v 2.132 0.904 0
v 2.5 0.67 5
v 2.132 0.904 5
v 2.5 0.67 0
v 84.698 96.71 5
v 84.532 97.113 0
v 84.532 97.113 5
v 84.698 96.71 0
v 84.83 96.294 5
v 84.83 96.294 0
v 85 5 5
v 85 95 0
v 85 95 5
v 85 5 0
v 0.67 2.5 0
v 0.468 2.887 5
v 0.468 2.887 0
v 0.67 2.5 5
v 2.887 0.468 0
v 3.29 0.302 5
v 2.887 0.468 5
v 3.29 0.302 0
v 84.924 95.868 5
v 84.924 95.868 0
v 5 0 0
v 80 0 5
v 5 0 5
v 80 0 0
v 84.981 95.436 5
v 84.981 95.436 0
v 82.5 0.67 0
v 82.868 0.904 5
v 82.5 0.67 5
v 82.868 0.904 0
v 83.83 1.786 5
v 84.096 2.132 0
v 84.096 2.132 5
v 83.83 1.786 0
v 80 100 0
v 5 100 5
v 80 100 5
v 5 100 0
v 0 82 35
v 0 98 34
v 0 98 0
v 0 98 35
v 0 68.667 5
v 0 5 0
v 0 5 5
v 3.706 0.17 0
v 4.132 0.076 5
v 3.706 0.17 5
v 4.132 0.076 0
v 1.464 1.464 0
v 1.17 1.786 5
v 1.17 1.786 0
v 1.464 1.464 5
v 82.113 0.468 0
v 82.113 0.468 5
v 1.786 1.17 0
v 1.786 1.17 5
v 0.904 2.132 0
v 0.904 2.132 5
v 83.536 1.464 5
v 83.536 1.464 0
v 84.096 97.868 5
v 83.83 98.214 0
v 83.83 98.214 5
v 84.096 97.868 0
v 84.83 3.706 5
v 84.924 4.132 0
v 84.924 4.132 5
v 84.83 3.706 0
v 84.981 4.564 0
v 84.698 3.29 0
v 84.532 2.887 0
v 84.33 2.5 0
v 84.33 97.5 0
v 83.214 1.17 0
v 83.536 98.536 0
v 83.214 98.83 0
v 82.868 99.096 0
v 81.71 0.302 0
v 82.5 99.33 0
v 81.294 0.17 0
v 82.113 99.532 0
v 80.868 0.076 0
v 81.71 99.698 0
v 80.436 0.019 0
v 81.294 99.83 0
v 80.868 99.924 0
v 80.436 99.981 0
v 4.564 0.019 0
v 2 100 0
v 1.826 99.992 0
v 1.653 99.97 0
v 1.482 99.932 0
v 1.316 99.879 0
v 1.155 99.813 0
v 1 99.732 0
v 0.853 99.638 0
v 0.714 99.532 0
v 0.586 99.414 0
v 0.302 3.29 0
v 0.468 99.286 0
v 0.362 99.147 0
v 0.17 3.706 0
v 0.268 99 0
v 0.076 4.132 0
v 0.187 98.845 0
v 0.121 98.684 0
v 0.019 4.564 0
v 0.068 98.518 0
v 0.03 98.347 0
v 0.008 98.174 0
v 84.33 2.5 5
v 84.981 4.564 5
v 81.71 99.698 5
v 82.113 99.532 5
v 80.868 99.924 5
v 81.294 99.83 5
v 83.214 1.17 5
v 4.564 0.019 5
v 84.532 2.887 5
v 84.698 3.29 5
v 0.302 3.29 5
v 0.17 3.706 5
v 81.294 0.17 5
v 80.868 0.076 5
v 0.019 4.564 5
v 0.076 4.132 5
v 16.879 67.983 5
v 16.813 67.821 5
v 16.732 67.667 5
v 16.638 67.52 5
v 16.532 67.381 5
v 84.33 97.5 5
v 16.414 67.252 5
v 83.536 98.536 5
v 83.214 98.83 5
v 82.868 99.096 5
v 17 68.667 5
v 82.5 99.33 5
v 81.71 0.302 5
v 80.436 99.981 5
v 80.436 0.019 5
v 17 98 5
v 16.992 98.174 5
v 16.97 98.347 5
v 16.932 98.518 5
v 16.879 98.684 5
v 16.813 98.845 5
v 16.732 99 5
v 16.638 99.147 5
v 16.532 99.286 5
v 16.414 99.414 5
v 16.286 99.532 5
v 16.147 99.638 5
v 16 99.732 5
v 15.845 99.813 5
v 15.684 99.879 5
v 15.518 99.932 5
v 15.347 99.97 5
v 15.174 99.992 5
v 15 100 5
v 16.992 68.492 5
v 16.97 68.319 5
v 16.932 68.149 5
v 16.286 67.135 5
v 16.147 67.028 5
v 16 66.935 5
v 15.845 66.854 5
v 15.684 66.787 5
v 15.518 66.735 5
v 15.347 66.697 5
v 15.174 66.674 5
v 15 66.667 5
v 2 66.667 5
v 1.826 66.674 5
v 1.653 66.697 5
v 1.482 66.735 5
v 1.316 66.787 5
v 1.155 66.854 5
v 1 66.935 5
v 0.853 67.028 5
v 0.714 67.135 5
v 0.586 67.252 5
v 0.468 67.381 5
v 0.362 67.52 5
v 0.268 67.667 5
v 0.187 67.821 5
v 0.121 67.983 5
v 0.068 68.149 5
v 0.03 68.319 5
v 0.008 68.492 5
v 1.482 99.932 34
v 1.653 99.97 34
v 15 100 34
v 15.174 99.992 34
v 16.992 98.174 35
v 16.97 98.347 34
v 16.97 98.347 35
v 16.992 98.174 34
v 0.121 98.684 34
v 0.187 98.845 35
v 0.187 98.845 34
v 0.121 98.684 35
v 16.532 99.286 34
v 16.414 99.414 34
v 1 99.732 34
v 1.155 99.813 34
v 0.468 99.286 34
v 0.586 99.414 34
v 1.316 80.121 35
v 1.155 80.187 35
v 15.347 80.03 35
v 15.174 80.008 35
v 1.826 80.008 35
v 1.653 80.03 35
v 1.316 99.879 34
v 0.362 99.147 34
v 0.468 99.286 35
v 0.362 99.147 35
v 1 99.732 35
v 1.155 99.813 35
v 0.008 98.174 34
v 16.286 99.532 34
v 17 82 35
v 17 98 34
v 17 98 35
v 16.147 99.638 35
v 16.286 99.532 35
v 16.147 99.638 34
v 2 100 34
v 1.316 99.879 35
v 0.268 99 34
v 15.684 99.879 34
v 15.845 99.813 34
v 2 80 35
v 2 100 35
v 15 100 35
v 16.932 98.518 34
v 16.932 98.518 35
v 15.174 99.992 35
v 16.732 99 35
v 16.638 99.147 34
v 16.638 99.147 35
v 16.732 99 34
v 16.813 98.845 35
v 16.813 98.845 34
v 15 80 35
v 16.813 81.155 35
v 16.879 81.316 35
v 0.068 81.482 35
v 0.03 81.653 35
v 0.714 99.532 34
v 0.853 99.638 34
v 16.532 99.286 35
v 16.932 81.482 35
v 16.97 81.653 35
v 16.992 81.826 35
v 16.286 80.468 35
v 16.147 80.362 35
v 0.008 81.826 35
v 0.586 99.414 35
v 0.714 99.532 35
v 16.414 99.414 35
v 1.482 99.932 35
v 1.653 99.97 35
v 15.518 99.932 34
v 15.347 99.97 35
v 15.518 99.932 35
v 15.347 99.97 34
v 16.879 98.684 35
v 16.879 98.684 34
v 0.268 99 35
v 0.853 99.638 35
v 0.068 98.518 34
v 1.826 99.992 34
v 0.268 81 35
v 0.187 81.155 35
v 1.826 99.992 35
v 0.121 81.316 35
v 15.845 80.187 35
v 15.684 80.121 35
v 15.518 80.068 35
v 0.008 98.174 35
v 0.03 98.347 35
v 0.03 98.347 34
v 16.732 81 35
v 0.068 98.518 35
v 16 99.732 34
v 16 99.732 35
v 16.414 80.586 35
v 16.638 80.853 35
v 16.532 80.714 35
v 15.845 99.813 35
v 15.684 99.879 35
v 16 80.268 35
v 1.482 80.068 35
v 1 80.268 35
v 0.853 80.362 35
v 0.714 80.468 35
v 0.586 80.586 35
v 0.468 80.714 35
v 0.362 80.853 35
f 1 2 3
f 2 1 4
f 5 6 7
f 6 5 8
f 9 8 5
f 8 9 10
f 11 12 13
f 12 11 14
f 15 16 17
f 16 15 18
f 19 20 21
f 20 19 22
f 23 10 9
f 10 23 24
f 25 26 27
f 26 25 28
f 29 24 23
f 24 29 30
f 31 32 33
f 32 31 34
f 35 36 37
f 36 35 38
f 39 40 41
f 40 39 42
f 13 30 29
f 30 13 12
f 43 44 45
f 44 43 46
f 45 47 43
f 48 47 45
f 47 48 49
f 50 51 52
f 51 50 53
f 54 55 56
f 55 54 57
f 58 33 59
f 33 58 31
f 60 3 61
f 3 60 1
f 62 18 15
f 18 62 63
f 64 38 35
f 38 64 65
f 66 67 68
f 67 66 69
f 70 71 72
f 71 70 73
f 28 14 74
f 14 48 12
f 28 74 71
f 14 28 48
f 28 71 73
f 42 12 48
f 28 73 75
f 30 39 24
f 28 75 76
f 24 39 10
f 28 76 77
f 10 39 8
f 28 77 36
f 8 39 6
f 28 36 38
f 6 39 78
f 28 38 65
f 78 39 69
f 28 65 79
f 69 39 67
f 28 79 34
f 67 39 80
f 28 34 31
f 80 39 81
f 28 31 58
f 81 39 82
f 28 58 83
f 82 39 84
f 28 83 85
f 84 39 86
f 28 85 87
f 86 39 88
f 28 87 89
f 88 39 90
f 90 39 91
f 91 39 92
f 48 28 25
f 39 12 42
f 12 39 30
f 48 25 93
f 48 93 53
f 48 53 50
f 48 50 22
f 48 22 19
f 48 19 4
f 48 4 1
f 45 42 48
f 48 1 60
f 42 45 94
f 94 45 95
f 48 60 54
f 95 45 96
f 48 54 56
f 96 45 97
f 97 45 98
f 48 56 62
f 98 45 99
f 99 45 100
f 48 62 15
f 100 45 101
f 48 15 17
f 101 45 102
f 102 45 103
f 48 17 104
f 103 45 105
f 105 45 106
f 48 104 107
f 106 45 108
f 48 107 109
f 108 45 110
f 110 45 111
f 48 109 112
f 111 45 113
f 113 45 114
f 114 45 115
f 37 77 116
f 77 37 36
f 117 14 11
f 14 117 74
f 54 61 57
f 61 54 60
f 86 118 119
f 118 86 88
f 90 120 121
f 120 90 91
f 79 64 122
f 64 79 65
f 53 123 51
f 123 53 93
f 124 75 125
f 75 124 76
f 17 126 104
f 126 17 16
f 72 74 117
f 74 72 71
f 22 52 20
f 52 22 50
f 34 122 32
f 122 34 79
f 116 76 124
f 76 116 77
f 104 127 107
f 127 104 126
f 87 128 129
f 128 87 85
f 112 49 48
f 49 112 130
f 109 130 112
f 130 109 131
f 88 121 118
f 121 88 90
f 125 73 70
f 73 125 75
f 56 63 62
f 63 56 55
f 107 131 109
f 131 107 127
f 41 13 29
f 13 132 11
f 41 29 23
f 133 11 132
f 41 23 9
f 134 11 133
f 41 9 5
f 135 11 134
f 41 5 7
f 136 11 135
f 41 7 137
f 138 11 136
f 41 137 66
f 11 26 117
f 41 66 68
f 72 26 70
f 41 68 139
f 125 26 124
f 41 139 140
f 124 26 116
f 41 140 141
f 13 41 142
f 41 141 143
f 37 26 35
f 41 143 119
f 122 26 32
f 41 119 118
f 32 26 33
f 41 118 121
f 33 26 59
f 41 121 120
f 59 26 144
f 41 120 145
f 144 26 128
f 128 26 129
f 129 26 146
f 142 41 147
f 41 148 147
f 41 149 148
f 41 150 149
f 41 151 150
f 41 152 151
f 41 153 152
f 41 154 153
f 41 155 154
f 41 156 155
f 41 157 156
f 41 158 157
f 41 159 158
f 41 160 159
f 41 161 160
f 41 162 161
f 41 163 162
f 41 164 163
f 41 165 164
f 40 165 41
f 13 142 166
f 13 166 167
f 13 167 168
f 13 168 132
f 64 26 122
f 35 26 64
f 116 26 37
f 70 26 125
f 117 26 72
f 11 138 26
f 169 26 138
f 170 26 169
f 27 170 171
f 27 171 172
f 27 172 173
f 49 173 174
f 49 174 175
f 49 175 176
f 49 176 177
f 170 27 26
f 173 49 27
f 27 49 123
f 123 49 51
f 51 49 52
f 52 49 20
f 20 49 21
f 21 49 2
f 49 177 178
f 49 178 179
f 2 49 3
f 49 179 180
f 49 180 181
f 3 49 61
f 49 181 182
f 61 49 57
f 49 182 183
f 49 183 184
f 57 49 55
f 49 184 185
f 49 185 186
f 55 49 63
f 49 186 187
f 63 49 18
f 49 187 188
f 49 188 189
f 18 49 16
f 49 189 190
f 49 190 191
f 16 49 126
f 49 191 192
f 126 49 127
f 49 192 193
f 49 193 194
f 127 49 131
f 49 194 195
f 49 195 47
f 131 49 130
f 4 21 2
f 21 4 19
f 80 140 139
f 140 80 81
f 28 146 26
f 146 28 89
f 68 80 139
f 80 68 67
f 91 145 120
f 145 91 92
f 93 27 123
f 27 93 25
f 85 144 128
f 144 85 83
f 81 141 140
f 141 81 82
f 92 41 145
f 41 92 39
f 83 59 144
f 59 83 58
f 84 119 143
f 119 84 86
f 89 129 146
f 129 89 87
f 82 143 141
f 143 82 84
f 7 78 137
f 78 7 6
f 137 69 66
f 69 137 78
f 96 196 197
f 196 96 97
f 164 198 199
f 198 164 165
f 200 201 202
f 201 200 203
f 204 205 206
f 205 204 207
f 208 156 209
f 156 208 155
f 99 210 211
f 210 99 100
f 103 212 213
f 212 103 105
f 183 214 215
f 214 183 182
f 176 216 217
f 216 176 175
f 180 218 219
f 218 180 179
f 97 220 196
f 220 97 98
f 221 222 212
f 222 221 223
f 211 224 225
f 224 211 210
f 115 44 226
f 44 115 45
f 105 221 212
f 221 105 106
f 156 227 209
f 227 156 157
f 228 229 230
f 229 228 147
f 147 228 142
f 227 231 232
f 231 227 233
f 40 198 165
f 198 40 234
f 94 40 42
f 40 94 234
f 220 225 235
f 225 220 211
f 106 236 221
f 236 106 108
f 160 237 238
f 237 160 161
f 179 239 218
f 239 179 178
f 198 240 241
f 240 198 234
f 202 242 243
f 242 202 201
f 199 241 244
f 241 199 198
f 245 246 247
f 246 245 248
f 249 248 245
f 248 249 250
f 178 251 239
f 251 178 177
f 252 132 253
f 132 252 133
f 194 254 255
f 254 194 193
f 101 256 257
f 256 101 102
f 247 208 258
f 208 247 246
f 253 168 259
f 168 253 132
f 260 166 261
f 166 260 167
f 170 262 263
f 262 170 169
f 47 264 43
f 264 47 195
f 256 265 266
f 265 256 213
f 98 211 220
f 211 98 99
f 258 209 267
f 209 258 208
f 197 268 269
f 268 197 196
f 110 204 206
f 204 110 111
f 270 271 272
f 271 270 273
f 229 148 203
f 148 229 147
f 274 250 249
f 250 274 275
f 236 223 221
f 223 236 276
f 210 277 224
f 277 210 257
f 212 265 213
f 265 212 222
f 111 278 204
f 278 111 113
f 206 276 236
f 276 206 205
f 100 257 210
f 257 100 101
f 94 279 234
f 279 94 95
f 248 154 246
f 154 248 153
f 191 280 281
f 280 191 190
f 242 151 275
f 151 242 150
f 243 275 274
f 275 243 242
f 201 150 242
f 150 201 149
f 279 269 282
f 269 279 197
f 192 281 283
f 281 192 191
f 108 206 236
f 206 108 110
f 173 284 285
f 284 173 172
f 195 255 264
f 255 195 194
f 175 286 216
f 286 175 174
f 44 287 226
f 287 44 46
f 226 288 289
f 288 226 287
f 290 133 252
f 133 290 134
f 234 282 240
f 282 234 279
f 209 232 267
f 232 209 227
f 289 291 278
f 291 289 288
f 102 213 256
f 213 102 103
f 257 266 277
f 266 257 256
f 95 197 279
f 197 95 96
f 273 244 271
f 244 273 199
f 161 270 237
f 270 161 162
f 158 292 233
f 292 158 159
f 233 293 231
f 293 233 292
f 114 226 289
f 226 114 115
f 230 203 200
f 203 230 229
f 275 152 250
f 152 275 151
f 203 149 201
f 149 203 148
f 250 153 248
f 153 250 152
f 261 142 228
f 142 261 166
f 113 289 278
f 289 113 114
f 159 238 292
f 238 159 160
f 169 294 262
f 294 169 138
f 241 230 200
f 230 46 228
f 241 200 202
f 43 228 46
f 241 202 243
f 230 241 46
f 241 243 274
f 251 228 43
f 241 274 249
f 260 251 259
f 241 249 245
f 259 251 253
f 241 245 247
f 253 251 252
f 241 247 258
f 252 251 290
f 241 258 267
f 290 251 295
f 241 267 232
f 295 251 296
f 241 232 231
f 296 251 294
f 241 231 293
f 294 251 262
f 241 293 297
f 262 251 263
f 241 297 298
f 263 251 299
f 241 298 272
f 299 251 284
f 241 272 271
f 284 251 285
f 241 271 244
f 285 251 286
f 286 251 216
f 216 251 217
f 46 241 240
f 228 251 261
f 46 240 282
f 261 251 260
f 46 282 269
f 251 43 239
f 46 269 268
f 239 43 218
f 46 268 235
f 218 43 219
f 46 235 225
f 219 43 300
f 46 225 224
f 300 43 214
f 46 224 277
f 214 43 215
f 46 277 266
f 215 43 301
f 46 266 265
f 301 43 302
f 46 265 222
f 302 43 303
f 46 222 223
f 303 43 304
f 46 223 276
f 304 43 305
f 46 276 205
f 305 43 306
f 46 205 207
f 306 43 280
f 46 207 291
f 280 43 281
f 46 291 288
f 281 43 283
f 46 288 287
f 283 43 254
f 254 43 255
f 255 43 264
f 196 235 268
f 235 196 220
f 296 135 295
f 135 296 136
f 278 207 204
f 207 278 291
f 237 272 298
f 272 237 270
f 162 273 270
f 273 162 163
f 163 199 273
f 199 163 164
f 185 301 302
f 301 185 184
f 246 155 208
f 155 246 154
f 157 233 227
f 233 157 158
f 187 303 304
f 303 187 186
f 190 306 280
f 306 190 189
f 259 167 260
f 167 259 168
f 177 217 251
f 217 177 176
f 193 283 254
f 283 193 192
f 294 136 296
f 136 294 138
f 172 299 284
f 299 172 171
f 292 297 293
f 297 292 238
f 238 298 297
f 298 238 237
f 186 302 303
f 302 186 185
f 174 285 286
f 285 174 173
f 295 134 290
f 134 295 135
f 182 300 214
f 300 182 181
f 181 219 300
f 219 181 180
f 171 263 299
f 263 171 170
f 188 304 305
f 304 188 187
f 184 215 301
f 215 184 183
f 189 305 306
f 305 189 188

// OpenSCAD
// * Discription what the *.scad is about ect.

// ==================================
// = Used Libraries =
// ==================================

// ==================================
// = Variables =
// ==================================

/* [Tab Name_1] */
// sizing printing or print a small part to test the object.
DesignStatus="sizing"; // ["sizing","fitting","printing"]
// Variables seen by customizer

BasePlateDIMENSION_X=85;
BasePlateDIMENSION_Y=100;
BasePlateRADIUS=5;
BasePlateDIMENSION_Z=5;

module __Customizer_Limit__ () {}  // before these, the variables are usable in the cutomizer
shown_by_customizer = false;

Invisible=42;
TestslabTransl_X=25;
TestslabRotate_X=30;

// === Facettes Numbers ===

FN_HexNut=6;
FN_Performance=36;
FN_FooBaa=12;
// Divisebile by 4 to align Cylinders whithout small intersections taht cause problems due to smal holes in surfaches and self intersections on round objects

FN_Rough=12;
FN_MediumRough=16;
FN_Medium=36;
FN_Fine=72;
FN_ExtraFine=144;
// ==================================
// = Tuning Variables =
// ==================================
// Variables for finetuning (The Slegehammer if something has to be made fit)

// ==================================
// = Customizer Section =
// ==================================
if (DesignStatus=="printing"){
    Main_Assembly(36,76,"false");
}
if(DesignStatus=="fitting"){
    intersection(){
        translate([0,0,1]){
            cube([1000,1000,1],center=true);
        }
        Main_Assembly(16,76,"false");
    }
}
if (DesignStatus=="sizing"){
    Main_Assembly(16,36,"true");
}
// ==================================
// = MAINASSEMBLY =
// ==================================
// LOW_RESOLUTION: low reaulution value to speed up preview
// HIGH_RESOLUTION: high resolution value for rendering the .stl
// CUT_MODULES_RENDERED: decides if the cuttingmodules get renderred to see them. use cuttingmodules twice one time within the final part to cut and one time to just schow it.
// Main_Assembly(12,76,true);
module Main_Assembly(LOW_RESOLUTION=12,HIGH_RESOLUTION=36,CUT_MODULES_RENDERED){
$fn = $preview ? LOW_RESOLUTION : HIGH_RESOLUTION ; // Facets in preview (F5) set to 12, in Reder (F6) is set to 72
    see_me_in_colourful(){
        translate([0,0,0]){
            difference(){
                Base_Plate_Wall_Mount();
//                TEST_OBJECT();
                translate([25,40,15]){                    
                    scale([0.4,0.4,0.4]){        
//                        TEST_CUTCUBE();
            }
        }
    }
        }
        translate([0,0,0]){
        
        }        
        translate([0,0,0]){
            difference(){
//                TEST_SPHERE();
                
            }
        }
        translate([0,0,0]){
        }
        translate([0,0,0]){
            if(CUT_MODULES_RENDERED=="true"){
//                TEST_CUTCYLINDER();
            }
            else{
                echo("CUT_MODULES_RENDERED= ",CUT_MODULES_RENDERED);
            }
        }
        union(){
            
        }
        translate([ 0,0,0]){
        }
    }
}
// ===============================================================================
// = Module to help coloring different modules to make it easier 
// ===============================================================================
module see_me_in_colourful(){ // iterates the given modules and colors them automaticly by setting values using trigonometric funktions
    translate([0,0,0]){
        for(i=[0:1:$children-1]){
            a=255;
            b=50;       // cuts away the dark colors to prevent bad visual contrast to backgound
            k_farbabstand=((a-b)/$children);
            Farbe=((k_farbabstand*i)/255);
            SINUS_Foo=0.5+(sin(((360/(a-b))*k_farbabstand)*(i+1)))/2;
            COSIN_Foo=0.5+(cos(((360/(a-b))*k_farbabstand)*(i+1)))/2;
            color(c = [ SINUS_Foo,
                        1-(SINUS_Foo/2+COSIN_Foo/2),
                        COSIN_Foo],
                        alpha = 0.5){  
                difference(){
                    render(convexity=10){children(i);} //renders the modules, effect is that inner holes become visible
                    //children(i);
                    translate([70/2,0,0]){
                        //cube([80,90,150],center=true);
                    }
// Creates a Cutting to see a Sidesection cut of the objects
                    color(c = [ SINUS_Foo,
                                1-(SINUS_Foo/2+COSIN_Foo/2),
                                COSIN_Foo],
                                alpha = 0.0){
                        translate([70/2,0,0]){
                            //cube([30,20,150],center=true);
                        }
                        translate([-50,-50,0]){
                            //cube([100,50,200],center=false);
                        }
                    }
                }
            }
        }
    }
}
// ===============================================================================
// =--------------------------------- Enviroment Modules ------------------------=
// ===============================================================================
// Modules that resembles the Enviroment aka the helmet where to atach a camera mount

// ===============================================================================
// =--------------------------------- Modules -----------------------------------=
// ===============================================================================

//BasePlateDIMENSION_X=85;
//BasePlateDIMENSION_Y=100;
//BasePlateRADIUS=5;
//BasePlateDIMENSION_Z=5;

module Hanger_Fork(){
   
}

//TEST_OBJECT();
module TEST_OBJECT(){
    difference(){
        TEST_CUTCUBE(TestSlab_X,TestSlab_Y,TestSlab_Z);
        TEST_CUTCYLINDER();
    }
    TEST_SPHERE();
}

module TEST_CUTCUBE(X=30,Y=60,Z=15){
    cube([X,Y,Z]);
}
module TEST_SPHERE(D=TestSphere_D){
//$fn = $preview ? 12 : 72; // Facets in preview (F5) set to 12, in Reder (F6) is set to 72
    difference(){
        sphere(d=D);
        TEST_CUTCYLINDER();
    }
}
module TEST_CUTCYLINDER(H=TestCylinder_H,D1=TestCylinder_D1,D2=TestCylinder_D2){
    cylinder(h=H,d1=D1,d2=D2,$fn=24);
}

// ===============================================================================
// ---------------------------------- Cutting Modules ----------------------------
// ===============================================================================
//Press_Fit_Cut(33,14,17,0.8);
module Press_Fit_Cut(Angle=22,Thickness=11,Length=22,Width=0.2){
    rotate([0,0,Angle]){
        translate([0,0,Thickness/2]){
            cylinder(h=Thickness,d=Width,center=true,$fn=12);
        }
        translate([0,-Width/2,0]){
            cube([Length,Width,Thickness]);
        }
        translate([Length,0,Thickness/2]){
            cylinder(h=Thickness,d=Width,center=true,$fn=12);
        }
    }
}

//Screwcutter(100,10,100,4,1,5);
module Screwcutter( SCREW_HEAD_h=200,
                    SCREW_HEAD_d=40,
                    SCREW_BOLT_h=200,
                    SCREW_BOLT_d=3,
                    SCREW_CAMPFER_h,
                    SCREW_CAMPFER_d=SCREW_BOLT_d    ){
    translate([0,0,-SCREW_HEAD_h]){
        cylinder(h=SCREW_HEAD_h,d=SCREW_HEAD_d,$fn=32);
    }
    translate([0,0,0]){
        cylinder(h=SCREW_CAMPFER_h,d2=SCREW_BOLT_d,d1=SCREW_CAMPFER_d,$fn=32);    
    }
    translate([0,0,0]){
        cylinder(h=SCREW_BOLT_h,d=SCREW_BOLT_d,$fn=32);
    }
}
//Bolt(25,3,8,3);
module Bolt(BOLTLENGTH,BOLTDIAMETER,HEADDIAMETER,HEADHEIGHT){
    cylinder(h=BOLTLENGTH,d=BOLTDIAMETER,center=false,$fn=FN_Performance);
    translate([0,0,-HEADHEIGHT/2]){
        cylinder(h=HEADHEIGHT,d=HEADDIAMETER,center=true,$fn=6);
        cylinder(h=HEADHEIGHT,d=HEADDIAMETER,center=true,$fn=6);
    }
}
//Projection_Cutter(3){sphere(10);};
module Projection_Cutter(Offset_z){    
    projection(cut = true){
        translate([0,0,Offset_z]){
            children();
        }
    }
}
// ===============================================================================
// ---------------------------------- Intersection Modules -----------------------
// ===============================================================================

module Intersection_Test_Cut(PLAIN,THICKNESS,OFFSET){
// ==== EXAMPLE ====
//    !Intersection_Test_Cut("xy",1,7/2){sphere(7);};
// ==== EXAMPLE ====
    if (PLAIN=="xz"){
        intersection(){
            children();
            translate([0,OFFSET,0]){
                cube([100,THICKNESS,100],center=true);
            }
        }
    }
    else if (PLAIN=="xy") {
        intersection(){
            children();
            translate([0,0,OFFSET]){
                cube([500,500,THICKNESS],center=true);
            }
        }
    }
    else if (PLAIN=="yz") {
        intersection(){
            children();
            translate([OFFSET,0,0]){
                cube([THICKNESS,100,100],center=true);
            }
        }   
    }
}
// ===============================================================================
// ---------------------------------- Linear Extrude Modules ---------------------
// ===============================================================================
//BasePlateWallMount();
module Base_Plate_Wall_Mount(){
    linear_extrude(height=BasePlateDIMENSION_Z){
        2D_Rounded_Square_Base_Shape(BasePlateDIMENSION_X,BasePlateDIMENSION_Y,BasePlateRADIUS,CENTER=false);
    }
}
//Ring_Shaper(3,15,1.5);
module Ring_Shaper(HEIGHT,OUTER,WALLTHICKNESS){
    linear_extrude(HEIGHT){
        2D_Ring_Shape(OUTER,WALLTHICKNESS);
    }
}
//Linear_Extruding(10,-1){2D_Rounded_Square_Base_Shape(10,20,3);}
module Linear_Extruding(ExtrudeLength,ExrtudingDirektionInverter){
//   0  Normal
//  -1  inverted
//   1  
    Length=ExtrudeLength;
    translate([0,0,Length*ExrtudingDirektionInverter]){
        linear_extrude(height=ExtrudeLength){
            children();
        }
    }
}

// ===============================================================================
// ---------------------------------- Rotate Extrude Modules ---------------------
// ===============================================================================

//DONUT(1,20,1,7);
module DONUT(DIAMETER,DIAMETER_RING,SCAL_X,SCAL_Y){
//DIAMETER The dough part
//DIAMETER_RING The hole part
//SCAL_X, skales the x dimension
//SCAL_Y, skales the y dimension
    rotate_extrude(angle=360,convexity=3,$fn=FN_Fine){
        translate([DIAMETER_RING,0,0]){
            scale([SCAL_X,SCAL_Y,1]){
                circle(d=DIAMETER,$fn=FN_Fine);
            }
        }
    }
}
// ===============================================================================
// =--------------------------------- 2D-Shapes ---------------------------------=
// ===============================================================================
Hanger_Fork_Z=35;

//!Base_Plate_Hanger_Fork();
//BasePlateDIMENSION_X=85;
//BasePlateDIMENSION_Y=100;
//BasePlateRADIUS=5;
//BasePlateDIMENSION_Z=5;
HangerRounderR=2;
LINeXtrude=1;
hull(){
    linear_extrude(height=BasePlateDIMENSION_Z){
        translate([0,BasePlateDIMENSION_Y-BasePlateDIMENSION_Y/3,Hanger_Fork_Z]){
        2D_Rounded_Square_Base_Shape(BasePlateDIMENSION_X/5,BasePlateDIMENSION_Y/3,HangerRounderR,CENTER=false);
//        Base_Plate_Hanger_Fork();
        }
    }
    translate([0,BasePlateDIMENSION_Y-BasePlateDIMENSION_Y/5,Hanger_Fork_Z]){
        translate([0,0,-LINeXtrude]){
            linear_extrude(height=LINeXtrude){
                2D_Rounded_Square_Base_Shape(BasePlateDIMENSION_X/5,BasePlateDIMENSION_Y/5,HangerRounderR,CENTER=false);
            }
        }
    }
}
module Base_Plate_Hanger_Fork(){
    hull(){
        translate([0,BasePlateDIMENSION_Y,0]){
            circle(r=HangerRounderR);
        }
        translate([0,BasePlateDIMENSION_Y-BasePlateDIMENSION_Y/3,0]){
            circle(r=HangerRounderR);
        }
        translate([BasePlateDIMENSION_X/5,BasePlateDIMENSION_Y-BasePlateDIMENSION_Y/3,0]){
            circle(r=HangerRounderR);
        }
        translate([BasePlateDIMENSION_X/5,BasePlateDIMENSION_Y,0]){
            circle(r=HangerRounderR);
        }
    }  
}
//2D_Ring_Shape(20,1);
module 2D_Ring_Shape(OUTER_D,WALLTHICKNESS){
    difference(){
        circle(d=OUTER_D,$fn=FN_Fine);
        circle(d=OUTER_D-2*WALLTHICKNESS,$fn=FN_Fine);
    }
}
//2D_Rounded_Square_Base_Shape(10,20,3);
module 2D_Rounded_Square_Base_Shape(DIMENSION_X=10,DIMENSION_Y=20,RADIUS=2,CENTER=true){
    if(CENTER){
        translate([0,0,0]){
            minkowski(){
                square([DIMENSION_X-RADIUS*2,DIMENSION_Y-RADIUS*2],center=CENTER);
                circle(r=RADIUS,$fn=FN_Fine);
            }
        }
    }
    else{
        translate([RADIUS,RADIUS,0]){
            minkowski(){
                square([DIMENSION_X-RADIUS*2,DIMENSION_Y-RADIUS*2],center=CENTER);
                circle(r=RADIUS,$fn=FN_Fine);
            }
        }
    }
}
//HEX_Mesh_Pattern(){ Mesh(2.5,2.5);}
module HEX_Mesh_Pattern(X=10,Y=30,DELTA=5,GRPL_X=45,GRPL_Y=115){
Count_X=X;
Count_Y=Y;
DIMENSION_X=35;
DIMENSION_Y=67;


//DELTA=1;

X_STEPP=5.5+DELTA;
Y_STEPP=7.5+DELTA;

k=DELTA; //Distance between Hexshapes may be HEX_D/4 is good
HEX_D=(DIMENSION_X-((Count_X-1)*k/2))/(Count_X-1);

SCALE_Y=DIMENSION_Y/((HEX_D/2+k/4)*sqrt(3)*(Count_Y-1));
echo("HEX_D*Count_Y",HEX_D*(Count_Y));
echo("GrindingPlate_Y",DIMENSION_Y);
echo("SCALE_Y",SCALE_Y);

//square([15,(HEX_D/2+k/4)*sqrt(3)*(Count_Y-1)]); // Helper Foo
    
// +++++++++++++++++++++++++++++++++++++++++
    scale([1,SCALE_Y,1]){
        union(){
            for(j=[0:1:Count_Y-1]){
                for(i=[0:1:Count_X-1-j%2]){
                    translate([i*(HEX_D+k/2),0,0]){
                        translate([(HEX_D/2+k/4)*(j%2),
                                    j*((HEX_D/2+k/4)*sqrt(3)),
                                    0]                          ){
                        //translate([0,j*Y_STEPP,0]){
                        rotate([0,0,60]){
                            //Mesh(0.5){square([HEX_D,HEX_D*1.2],center=true);}
                            circle(d=HEX_D,$fn=6);
                        }
                            //children();
                        }
                    }
                }
            }
        }
    }
}
//Mesh(4){square([7,10],center=true);}
module Mesh(RADIUS=0.0){
minkowski(){
    children();
    circle(r=RADIUS,$fn=144);
    }
}
// ===============================================================================
// =--------------------------------- Symetrie Helper ---------------------------=
// ===============================================================================
// XY_Symetrie(10,25){cube(10);}
module XY_Symetrie(X=10,Y=25){
   translate([X,Y,0]){
       children();
       }
    mirror([1,0,0]){
        translate([X,Y,0]){
            children();
       }
    }
    mirror([0,1,0]){
        translate([X,Y,0]){
            children();
        }
        mirror([1,0,0]){
            translate([X,Y,0]){
                children();
            }
        }
    }
}
module MirrorMirrorOnTheWall(Offset_X,Offset_Y){
    translate([-Offset_X,Offset_Y,0]){
        children();
        mirror([0,1,0]){
            children();
        }
    }
    translate([Offset_X,-Offset_Y,0]){
        mirror([1,0,0]){
            children();
            mirror([1,0,0]){
                children();
            }
        }
    }
}
// ===============================================================================
// =--------------------------------- Textembossing -----------------------------=
// ===============================================================================

// ===============================================================================
// =--------------------------------- Smoothing ---------------------------------=
// ===============================================================================
2D_Smooth_r=1;
// Radius of a outer Tip Rounding 
2D_Fillet_r=1;
// Radius of a inner corner Ronding
2D_Chamfer_DELTA_INN=1;
2D_Chamfer_DELTA_OUT=2;
// a straigt line on edges and corners
2D_Chamfer_BOOLEAN=false;    
module Smooth(r=3){
    //$fn=30;
    offset(r=r,$fn=30){
        offset(r=-r,$fn=30){
        children();
        }
    }
}
module Fillet(r=3){
    //$fn=30;
    offset(r=-r,$fn=30){
        offset(r=r,$fn=30){
            children();
        }
    }
}
module Chamfer_OUTWARD(DELTA_OUT=3){
    //$fn=30;
    offset(delta=DELTA_OUT,chamfer=true,$fn=30){
        offset(delta=-DELTA_OUT,chamfer=true, $fn=30){
            children();
        }
    }
}
module Chamfer_INWARD(DELTA_INN=3){
    //$fn=30;
    offset(delta=-DELTA_INN,chamfer=true,$fn=30){
        offset(delta=DELTA_INN,chamfer=true, $fn=30){
            children();
        }
    }
}
// ===============================================================================
// =--------------------------------- Ruthex --------------------------------=
// ===============================================================================
// Dimensions for Ruthex Tread inseerts
//RUTHEX_M3();
module RUTHEX_M3(){    
L=5.7+5.7*0.25; // Length + Margin
echo("RUTHEX",L);
D1=4.0;    
    translate([0,0,0]){
        rotate([0,0,0]){
            translate([0,0,0]){
                cylinder(h=L,d1=D1,d2=D1,$fn=FN_Performance);
            }
        }
    }
}
// ===============================================================================
// =--------------------------------- Import STL --------------------------------=
// ===============================================================================
module NAME_OF_IMPORT(){
    rotate([0,0,-90]){
        translate([-515,-100,-45]){
            import("PATH/TO/FILE.stl",convexity=3);
        }
    }
}
// ===============================================================================
// =--------------------------------- Import PNG --------------------------------=
// ===============================================================================
module NAME_OF_IMPORT(){
    rotate([0,0,-90]){
        translate([-515,-100,-45]){
            import("PATH/TO/FILE.PNG",convexity=3);
        }
    }
}
